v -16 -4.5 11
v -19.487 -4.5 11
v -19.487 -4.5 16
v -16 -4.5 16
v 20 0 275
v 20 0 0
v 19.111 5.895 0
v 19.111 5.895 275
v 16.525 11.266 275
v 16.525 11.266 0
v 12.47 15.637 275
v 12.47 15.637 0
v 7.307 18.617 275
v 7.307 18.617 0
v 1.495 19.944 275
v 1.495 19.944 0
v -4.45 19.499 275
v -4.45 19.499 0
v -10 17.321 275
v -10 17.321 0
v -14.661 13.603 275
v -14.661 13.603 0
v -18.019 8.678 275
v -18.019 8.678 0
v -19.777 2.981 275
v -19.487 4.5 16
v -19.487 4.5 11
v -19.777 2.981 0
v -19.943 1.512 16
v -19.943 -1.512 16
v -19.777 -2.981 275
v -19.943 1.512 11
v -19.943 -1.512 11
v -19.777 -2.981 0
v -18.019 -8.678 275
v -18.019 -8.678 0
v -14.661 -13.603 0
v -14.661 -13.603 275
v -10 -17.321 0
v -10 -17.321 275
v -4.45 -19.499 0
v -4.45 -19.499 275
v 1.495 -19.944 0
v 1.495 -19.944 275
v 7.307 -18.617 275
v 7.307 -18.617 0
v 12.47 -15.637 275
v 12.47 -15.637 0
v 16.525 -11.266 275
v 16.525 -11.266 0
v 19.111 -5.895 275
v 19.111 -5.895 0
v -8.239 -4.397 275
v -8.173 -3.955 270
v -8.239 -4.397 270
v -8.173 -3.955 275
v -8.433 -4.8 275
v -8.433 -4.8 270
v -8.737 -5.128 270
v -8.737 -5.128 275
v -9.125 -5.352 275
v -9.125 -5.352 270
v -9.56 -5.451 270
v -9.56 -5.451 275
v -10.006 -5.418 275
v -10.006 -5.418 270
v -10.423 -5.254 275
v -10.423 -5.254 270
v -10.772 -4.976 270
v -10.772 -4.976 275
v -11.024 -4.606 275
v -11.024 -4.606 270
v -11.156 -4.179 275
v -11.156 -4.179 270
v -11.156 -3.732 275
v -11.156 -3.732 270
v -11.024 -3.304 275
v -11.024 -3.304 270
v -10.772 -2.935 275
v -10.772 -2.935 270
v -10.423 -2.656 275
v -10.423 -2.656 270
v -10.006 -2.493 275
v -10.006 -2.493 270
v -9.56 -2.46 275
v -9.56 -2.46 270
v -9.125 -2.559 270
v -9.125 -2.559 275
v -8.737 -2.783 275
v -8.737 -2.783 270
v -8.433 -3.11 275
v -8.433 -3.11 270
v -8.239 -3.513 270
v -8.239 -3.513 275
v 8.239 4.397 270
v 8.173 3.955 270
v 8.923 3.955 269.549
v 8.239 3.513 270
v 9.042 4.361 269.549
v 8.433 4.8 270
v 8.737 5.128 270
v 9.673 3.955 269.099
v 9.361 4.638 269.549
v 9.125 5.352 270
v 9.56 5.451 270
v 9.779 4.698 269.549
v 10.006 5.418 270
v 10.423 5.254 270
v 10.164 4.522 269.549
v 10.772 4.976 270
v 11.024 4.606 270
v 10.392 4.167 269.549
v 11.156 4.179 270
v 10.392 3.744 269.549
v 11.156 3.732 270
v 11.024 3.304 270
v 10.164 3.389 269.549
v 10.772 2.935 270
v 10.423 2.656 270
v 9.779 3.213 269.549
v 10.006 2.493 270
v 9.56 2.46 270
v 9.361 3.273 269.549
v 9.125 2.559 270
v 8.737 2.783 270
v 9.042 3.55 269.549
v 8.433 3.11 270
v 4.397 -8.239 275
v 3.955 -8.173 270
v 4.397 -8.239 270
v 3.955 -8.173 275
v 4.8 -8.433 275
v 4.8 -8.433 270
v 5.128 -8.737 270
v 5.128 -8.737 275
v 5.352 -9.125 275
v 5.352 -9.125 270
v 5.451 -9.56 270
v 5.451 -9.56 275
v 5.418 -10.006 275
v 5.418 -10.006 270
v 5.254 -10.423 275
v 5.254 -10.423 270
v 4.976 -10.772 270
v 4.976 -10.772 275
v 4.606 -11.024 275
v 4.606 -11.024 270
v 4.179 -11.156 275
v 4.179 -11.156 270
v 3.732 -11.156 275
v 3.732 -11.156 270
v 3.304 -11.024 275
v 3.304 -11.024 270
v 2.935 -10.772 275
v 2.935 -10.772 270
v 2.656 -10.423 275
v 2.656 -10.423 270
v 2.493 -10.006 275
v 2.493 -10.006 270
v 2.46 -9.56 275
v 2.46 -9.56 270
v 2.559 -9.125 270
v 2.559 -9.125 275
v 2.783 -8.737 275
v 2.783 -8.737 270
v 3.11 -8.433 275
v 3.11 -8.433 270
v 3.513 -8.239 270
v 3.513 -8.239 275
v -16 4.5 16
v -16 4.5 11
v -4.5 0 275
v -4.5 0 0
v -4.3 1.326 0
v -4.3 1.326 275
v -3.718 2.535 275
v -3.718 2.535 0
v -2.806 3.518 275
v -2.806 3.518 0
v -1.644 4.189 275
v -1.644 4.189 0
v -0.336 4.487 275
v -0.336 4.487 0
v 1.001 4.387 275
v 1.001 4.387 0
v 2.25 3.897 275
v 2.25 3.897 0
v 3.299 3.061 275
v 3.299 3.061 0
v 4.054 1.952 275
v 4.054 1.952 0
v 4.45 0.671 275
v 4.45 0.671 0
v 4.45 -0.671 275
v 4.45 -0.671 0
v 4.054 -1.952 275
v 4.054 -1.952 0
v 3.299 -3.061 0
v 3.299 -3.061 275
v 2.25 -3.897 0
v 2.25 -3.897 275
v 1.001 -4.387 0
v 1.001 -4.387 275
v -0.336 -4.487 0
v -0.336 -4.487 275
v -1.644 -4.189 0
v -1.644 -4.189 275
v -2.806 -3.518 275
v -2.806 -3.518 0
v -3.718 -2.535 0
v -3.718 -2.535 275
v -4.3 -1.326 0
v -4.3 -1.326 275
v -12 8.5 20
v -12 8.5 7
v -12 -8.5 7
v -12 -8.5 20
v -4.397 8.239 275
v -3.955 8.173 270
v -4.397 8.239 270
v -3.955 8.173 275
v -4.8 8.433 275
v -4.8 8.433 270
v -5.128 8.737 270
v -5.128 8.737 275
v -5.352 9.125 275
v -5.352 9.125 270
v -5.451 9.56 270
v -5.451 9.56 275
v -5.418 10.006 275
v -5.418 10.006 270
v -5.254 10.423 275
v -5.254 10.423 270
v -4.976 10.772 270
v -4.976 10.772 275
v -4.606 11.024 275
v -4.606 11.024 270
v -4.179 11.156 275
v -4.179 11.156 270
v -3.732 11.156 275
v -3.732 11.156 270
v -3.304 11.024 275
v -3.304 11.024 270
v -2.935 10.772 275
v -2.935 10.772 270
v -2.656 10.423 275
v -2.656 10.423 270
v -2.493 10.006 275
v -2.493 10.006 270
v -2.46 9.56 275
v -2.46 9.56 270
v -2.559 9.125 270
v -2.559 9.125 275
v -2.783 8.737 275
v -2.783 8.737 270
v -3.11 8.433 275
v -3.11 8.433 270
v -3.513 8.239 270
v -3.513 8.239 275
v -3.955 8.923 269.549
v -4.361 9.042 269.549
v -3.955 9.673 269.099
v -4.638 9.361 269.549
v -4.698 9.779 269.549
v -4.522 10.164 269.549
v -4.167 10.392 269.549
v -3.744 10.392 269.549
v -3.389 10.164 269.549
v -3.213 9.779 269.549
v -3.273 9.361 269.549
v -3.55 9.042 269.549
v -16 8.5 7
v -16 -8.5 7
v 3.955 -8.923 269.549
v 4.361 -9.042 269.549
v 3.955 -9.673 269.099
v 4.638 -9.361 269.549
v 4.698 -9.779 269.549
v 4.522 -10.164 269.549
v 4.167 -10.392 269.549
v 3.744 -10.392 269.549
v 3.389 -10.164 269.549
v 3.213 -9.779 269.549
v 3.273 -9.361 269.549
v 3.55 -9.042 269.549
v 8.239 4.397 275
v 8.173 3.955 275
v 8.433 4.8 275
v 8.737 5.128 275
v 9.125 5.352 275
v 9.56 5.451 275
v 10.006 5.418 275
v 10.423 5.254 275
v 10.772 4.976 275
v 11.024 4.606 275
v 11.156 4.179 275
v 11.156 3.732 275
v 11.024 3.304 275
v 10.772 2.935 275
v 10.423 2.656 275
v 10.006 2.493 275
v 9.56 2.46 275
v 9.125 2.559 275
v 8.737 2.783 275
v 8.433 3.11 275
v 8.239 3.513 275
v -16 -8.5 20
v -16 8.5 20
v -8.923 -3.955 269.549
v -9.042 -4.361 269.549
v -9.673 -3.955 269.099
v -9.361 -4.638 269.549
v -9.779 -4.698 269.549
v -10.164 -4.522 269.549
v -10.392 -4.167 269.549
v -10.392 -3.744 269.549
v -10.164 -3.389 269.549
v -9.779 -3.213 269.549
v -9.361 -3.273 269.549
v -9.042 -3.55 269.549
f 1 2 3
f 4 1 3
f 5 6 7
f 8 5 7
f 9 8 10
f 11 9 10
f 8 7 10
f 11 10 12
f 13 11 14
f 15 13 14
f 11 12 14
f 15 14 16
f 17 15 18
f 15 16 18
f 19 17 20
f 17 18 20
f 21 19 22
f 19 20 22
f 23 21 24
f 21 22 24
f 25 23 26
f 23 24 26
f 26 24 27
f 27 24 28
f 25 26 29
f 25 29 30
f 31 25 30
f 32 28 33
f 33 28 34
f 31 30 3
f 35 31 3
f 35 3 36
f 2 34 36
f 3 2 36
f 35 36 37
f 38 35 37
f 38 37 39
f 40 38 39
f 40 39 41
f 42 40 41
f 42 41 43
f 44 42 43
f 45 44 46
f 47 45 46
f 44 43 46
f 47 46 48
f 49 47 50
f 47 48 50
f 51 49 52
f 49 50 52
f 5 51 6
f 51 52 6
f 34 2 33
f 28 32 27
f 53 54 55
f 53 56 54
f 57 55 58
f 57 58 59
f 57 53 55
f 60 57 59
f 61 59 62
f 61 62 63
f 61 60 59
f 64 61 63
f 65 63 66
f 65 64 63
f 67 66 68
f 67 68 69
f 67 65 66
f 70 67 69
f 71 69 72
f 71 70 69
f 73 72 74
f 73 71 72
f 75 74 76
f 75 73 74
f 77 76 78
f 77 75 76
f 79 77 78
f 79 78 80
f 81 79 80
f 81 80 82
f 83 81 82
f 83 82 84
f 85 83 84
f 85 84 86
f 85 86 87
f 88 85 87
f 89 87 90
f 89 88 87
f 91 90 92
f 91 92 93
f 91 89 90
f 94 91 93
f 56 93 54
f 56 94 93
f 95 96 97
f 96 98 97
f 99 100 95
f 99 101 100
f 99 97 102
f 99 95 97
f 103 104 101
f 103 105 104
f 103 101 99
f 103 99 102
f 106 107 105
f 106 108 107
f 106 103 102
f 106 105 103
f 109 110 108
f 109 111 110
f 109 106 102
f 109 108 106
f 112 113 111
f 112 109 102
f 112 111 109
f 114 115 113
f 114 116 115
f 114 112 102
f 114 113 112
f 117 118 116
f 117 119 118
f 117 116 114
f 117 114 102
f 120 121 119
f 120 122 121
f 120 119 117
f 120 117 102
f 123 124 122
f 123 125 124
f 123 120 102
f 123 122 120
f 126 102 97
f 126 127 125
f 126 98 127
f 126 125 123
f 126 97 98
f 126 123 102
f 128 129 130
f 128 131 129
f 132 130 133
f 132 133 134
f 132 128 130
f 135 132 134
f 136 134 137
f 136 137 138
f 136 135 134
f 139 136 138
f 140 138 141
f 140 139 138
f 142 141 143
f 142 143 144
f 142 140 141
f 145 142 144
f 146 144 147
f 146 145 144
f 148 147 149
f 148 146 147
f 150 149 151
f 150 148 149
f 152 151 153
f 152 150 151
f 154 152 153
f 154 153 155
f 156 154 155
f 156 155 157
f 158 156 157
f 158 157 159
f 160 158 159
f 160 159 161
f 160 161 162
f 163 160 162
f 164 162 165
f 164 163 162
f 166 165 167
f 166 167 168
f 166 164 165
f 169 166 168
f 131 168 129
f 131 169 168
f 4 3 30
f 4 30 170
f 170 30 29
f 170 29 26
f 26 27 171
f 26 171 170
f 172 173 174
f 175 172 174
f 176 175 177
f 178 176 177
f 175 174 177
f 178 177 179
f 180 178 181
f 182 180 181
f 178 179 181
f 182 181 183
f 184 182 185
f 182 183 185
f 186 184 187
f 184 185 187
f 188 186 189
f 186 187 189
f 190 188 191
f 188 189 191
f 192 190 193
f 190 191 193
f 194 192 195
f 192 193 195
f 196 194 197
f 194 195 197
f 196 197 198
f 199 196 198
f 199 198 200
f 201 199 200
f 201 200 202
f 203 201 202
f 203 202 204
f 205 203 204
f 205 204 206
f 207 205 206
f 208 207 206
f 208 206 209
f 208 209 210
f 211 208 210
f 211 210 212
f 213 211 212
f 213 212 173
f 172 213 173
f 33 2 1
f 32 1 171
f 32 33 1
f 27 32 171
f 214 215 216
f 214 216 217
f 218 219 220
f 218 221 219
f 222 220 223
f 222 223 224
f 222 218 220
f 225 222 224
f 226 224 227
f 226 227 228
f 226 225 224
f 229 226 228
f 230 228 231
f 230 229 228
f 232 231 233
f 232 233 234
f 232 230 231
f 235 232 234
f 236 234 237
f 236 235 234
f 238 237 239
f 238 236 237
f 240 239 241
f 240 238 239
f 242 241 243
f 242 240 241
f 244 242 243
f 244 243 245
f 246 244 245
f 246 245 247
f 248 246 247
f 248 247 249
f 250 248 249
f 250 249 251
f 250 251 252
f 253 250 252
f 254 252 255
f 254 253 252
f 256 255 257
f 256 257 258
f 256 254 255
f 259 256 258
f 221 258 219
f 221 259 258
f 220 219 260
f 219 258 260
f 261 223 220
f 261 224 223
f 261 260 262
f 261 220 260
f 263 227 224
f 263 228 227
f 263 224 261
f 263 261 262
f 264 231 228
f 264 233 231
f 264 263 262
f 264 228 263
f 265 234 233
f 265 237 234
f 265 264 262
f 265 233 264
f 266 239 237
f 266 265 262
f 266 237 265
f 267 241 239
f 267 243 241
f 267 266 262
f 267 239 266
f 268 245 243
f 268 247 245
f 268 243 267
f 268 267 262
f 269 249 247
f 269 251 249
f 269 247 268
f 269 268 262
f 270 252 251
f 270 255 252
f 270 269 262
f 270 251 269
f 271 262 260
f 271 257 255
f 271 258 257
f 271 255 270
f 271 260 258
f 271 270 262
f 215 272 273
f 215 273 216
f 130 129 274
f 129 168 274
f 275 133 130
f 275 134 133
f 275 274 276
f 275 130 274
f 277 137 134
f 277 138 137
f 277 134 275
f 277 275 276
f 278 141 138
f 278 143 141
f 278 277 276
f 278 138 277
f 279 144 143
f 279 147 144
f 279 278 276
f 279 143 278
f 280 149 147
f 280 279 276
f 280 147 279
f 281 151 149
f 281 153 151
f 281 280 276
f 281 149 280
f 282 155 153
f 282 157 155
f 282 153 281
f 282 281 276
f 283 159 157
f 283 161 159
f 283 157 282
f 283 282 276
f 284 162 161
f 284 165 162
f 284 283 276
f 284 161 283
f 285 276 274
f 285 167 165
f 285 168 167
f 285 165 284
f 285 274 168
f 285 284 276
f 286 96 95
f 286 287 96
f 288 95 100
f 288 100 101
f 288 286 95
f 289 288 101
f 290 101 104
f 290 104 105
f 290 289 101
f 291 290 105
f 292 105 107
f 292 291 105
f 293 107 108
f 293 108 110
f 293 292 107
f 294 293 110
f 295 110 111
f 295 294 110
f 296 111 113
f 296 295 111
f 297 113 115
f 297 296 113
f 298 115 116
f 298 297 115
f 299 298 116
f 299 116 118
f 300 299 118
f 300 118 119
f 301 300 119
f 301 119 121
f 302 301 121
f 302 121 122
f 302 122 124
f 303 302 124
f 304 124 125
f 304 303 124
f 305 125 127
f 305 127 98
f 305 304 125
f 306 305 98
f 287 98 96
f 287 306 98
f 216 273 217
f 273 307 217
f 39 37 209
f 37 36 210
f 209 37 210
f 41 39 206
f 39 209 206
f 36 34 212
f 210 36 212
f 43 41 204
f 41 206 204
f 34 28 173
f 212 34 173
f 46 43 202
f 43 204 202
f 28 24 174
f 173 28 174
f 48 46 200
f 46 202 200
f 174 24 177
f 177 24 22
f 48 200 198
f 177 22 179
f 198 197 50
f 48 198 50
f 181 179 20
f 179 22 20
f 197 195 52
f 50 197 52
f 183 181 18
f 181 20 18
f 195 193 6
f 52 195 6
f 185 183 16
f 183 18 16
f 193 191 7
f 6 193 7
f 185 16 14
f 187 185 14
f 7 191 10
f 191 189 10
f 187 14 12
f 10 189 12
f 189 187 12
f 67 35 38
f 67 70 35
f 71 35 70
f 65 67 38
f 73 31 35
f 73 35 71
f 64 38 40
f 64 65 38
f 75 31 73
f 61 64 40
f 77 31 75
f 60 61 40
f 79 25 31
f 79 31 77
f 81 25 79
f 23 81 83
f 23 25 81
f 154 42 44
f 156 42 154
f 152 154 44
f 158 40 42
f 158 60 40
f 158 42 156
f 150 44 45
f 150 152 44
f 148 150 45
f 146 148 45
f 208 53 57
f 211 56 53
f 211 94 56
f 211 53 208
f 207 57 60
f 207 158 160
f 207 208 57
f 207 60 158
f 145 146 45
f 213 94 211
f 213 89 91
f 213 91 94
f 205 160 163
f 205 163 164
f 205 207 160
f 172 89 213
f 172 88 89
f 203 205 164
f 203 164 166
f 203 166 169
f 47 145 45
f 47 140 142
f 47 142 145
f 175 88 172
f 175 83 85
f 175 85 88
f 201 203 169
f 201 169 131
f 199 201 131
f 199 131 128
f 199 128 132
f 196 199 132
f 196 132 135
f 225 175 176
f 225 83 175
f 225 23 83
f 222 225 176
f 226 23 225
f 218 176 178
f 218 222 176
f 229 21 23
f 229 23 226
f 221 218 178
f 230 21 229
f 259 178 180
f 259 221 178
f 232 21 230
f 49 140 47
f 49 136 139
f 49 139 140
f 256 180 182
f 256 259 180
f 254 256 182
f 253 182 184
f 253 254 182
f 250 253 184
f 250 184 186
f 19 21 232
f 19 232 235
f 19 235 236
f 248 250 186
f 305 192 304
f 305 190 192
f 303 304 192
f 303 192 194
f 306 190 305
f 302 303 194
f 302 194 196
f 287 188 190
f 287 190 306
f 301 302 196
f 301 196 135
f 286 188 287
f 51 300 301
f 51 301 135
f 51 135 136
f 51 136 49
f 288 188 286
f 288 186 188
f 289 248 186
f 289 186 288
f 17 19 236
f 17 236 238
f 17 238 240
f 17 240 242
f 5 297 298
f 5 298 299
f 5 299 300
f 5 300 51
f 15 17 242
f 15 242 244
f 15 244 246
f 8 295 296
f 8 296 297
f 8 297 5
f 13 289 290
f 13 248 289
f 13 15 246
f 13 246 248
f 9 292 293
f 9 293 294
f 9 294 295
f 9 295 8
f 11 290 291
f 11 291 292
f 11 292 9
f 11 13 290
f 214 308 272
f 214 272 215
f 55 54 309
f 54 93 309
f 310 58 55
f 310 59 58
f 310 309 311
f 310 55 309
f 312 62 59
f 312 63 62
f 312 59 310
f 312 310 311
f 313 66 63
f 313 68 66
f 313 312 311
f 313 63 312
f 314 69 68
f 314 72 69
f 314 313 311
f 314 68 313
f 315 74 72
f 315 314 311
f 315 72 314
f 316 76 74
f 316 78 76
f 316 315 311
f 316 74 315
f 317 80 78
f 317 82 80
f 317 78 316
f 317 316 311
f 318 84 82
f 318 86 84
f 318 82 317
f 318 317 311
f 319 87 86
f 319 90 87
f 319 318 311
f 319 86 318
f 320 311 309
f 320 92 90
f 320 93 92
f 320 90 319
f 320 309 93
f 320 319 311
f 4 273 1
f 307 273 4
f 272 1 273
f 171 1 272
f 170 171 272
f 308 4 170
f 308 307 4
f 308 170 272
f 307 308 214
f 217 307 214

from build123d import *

# Parameters (mm, degrees)
SKETCH2_R           = 20
BOSS_EXTRUDE1_DEPTH = 275
SKETCH5_W           = 5
SKETCH5_H           = 9
CUT_EXTRUDE2_DEPTH  = 8
SKETCH8_W           = 4
SKETCH8_H           = 9
CUT_EXTRUDE3_DEPTH  = 4
CUT_EXTRUDE4_START  = 5
SKETCH8_4_W         = 4
SKETCH8_4_H         = 9
CUT_EXTRUDE4_DEPTH  = 4
SKETCH9_W           = 4
SKETCH9_H           = 13
CUT_EXTRUDE5_DEPTH  = 4
CUT_EXTRUDE6_START  = 9
CUT_EXTRUDE6_DEPTH  = 4
SKETCH10_R          = 4.5
CUT_EXTRUDE7_DEPTH  = 277.450718936
CIRPATTERN1_COUNT   = 4


with BuildPart() as part:
    # Sketch2 → Boss-Extrude1 (new body)
    with BuildSketch(Plane.XY):
        Circle(SKETCH2_R)
    extrude(amount=BOSS_EXTRUDE1_DEPTH)

    # Sketch5 → Cut-Extrude2 (cut)
    with BuildSketch(Plane.ZY.offset(20)):
        with Locations((13.5, 0)):
            Rectangle(SKETCH5_W, SKETCH5_H)
    extrude(amount=-CUT_EXTRUDE2_DEPTH, mode=Mode.SUBTRACT)

    # Sketch8 → Cut-Extrude3 (cut)
    with BuildSketch(Plane.XY.offset(11)):
        with Locations((-14, 0)):
            Rectangle(SKETCH8_W, SKETCH8_H)
    extrude(amount=-CUT_EXTRUDE3_DEPTH, mode=Mode.SUBTRACT)

    # Sketch8<4> → Cut-Extrude4 (cut)
    with BuildSketch(Plane.XY.offset(11).offset(CUT_EXTRUDE4_START)):
        with Locations((-14, 0)):
            Rectangle(SKETCH8_4_W, SKETCH8_4_H)
    extrude(amount=CUT_EXTRUDE4_DEPTH, mode=Mode.SUBTRACT)

    # Sketch9 → Cut-Extrude5 (cut)
    with BuildSketch(Plane.XZ.offset(-4.5)):
        with Locations((-14, 13.5)):
            Rectangle(SKETCH9_W, SKETCH9_H)
    extrude(amount=-CUT_EXTRUDE5_DEPTH, mode=Mode.SUBTRACT)

    # Sketch9<2> → Cut-Extrude6 (cut)
    with BuildSketch(Plane.XZ.offset(-4.5).offset(CUT_EXTRUDE6_START)):
        Polygon((-16, 16), (-16, 11), (-16, 7), (-12, 7), (-12, 20), (-16, 20), align=None)
    extrude(amount=CUT_EXTRUDE6_DEPTH, mode=Mode.SUBTRACT)

    # Sketch10 → Cut-Extrude7 (cut, through all)
    with BuildSketch(Plane(origin=(0, 0, 0), x_dir=(-1, 0, 0), z_dir=(0, 0, -1))):
        Circle(SKETCH10_R)
    extrude(amount=-CUT_EXTRUDE7_DEPTH, mode=Mode.SUBTRACT)

    # Sketch13 → Ø3.0 (3) Diameter Hole1 (revolve, cut)
    with BuildSketch(Plane(origin=(-3.955313085, 9.672538364, 275), x_dir=(0, -1, 0), z_dir=(1, 0, 0))):
        Polygon((0, 0), (0, 5.901290929), (1.5, 5), (1.5, 0), align=None)
    f_3_0_3_diameter_hole1 = revolve(axis=Axis((-3.955313085, 9.672538364, 281.35), (0, 0, -1)), mode=Mode.SUBTRACT)

    # CirPattern1: Ø3.0 (3) Diameter Hole1 ×4 about axis
    cirpattern1_axis = Axis((0, 0, 0), (0, 0, 1))
    for i in range(1, CIRPATTERN1_COUNT):
        add(f_3_0_3_diameter_hole1.rotate(cirpattern1_axis, i * 360 / CIRPATTERN1_COUNT), mode=Mode.SUBTRACT)


solid = part.part
